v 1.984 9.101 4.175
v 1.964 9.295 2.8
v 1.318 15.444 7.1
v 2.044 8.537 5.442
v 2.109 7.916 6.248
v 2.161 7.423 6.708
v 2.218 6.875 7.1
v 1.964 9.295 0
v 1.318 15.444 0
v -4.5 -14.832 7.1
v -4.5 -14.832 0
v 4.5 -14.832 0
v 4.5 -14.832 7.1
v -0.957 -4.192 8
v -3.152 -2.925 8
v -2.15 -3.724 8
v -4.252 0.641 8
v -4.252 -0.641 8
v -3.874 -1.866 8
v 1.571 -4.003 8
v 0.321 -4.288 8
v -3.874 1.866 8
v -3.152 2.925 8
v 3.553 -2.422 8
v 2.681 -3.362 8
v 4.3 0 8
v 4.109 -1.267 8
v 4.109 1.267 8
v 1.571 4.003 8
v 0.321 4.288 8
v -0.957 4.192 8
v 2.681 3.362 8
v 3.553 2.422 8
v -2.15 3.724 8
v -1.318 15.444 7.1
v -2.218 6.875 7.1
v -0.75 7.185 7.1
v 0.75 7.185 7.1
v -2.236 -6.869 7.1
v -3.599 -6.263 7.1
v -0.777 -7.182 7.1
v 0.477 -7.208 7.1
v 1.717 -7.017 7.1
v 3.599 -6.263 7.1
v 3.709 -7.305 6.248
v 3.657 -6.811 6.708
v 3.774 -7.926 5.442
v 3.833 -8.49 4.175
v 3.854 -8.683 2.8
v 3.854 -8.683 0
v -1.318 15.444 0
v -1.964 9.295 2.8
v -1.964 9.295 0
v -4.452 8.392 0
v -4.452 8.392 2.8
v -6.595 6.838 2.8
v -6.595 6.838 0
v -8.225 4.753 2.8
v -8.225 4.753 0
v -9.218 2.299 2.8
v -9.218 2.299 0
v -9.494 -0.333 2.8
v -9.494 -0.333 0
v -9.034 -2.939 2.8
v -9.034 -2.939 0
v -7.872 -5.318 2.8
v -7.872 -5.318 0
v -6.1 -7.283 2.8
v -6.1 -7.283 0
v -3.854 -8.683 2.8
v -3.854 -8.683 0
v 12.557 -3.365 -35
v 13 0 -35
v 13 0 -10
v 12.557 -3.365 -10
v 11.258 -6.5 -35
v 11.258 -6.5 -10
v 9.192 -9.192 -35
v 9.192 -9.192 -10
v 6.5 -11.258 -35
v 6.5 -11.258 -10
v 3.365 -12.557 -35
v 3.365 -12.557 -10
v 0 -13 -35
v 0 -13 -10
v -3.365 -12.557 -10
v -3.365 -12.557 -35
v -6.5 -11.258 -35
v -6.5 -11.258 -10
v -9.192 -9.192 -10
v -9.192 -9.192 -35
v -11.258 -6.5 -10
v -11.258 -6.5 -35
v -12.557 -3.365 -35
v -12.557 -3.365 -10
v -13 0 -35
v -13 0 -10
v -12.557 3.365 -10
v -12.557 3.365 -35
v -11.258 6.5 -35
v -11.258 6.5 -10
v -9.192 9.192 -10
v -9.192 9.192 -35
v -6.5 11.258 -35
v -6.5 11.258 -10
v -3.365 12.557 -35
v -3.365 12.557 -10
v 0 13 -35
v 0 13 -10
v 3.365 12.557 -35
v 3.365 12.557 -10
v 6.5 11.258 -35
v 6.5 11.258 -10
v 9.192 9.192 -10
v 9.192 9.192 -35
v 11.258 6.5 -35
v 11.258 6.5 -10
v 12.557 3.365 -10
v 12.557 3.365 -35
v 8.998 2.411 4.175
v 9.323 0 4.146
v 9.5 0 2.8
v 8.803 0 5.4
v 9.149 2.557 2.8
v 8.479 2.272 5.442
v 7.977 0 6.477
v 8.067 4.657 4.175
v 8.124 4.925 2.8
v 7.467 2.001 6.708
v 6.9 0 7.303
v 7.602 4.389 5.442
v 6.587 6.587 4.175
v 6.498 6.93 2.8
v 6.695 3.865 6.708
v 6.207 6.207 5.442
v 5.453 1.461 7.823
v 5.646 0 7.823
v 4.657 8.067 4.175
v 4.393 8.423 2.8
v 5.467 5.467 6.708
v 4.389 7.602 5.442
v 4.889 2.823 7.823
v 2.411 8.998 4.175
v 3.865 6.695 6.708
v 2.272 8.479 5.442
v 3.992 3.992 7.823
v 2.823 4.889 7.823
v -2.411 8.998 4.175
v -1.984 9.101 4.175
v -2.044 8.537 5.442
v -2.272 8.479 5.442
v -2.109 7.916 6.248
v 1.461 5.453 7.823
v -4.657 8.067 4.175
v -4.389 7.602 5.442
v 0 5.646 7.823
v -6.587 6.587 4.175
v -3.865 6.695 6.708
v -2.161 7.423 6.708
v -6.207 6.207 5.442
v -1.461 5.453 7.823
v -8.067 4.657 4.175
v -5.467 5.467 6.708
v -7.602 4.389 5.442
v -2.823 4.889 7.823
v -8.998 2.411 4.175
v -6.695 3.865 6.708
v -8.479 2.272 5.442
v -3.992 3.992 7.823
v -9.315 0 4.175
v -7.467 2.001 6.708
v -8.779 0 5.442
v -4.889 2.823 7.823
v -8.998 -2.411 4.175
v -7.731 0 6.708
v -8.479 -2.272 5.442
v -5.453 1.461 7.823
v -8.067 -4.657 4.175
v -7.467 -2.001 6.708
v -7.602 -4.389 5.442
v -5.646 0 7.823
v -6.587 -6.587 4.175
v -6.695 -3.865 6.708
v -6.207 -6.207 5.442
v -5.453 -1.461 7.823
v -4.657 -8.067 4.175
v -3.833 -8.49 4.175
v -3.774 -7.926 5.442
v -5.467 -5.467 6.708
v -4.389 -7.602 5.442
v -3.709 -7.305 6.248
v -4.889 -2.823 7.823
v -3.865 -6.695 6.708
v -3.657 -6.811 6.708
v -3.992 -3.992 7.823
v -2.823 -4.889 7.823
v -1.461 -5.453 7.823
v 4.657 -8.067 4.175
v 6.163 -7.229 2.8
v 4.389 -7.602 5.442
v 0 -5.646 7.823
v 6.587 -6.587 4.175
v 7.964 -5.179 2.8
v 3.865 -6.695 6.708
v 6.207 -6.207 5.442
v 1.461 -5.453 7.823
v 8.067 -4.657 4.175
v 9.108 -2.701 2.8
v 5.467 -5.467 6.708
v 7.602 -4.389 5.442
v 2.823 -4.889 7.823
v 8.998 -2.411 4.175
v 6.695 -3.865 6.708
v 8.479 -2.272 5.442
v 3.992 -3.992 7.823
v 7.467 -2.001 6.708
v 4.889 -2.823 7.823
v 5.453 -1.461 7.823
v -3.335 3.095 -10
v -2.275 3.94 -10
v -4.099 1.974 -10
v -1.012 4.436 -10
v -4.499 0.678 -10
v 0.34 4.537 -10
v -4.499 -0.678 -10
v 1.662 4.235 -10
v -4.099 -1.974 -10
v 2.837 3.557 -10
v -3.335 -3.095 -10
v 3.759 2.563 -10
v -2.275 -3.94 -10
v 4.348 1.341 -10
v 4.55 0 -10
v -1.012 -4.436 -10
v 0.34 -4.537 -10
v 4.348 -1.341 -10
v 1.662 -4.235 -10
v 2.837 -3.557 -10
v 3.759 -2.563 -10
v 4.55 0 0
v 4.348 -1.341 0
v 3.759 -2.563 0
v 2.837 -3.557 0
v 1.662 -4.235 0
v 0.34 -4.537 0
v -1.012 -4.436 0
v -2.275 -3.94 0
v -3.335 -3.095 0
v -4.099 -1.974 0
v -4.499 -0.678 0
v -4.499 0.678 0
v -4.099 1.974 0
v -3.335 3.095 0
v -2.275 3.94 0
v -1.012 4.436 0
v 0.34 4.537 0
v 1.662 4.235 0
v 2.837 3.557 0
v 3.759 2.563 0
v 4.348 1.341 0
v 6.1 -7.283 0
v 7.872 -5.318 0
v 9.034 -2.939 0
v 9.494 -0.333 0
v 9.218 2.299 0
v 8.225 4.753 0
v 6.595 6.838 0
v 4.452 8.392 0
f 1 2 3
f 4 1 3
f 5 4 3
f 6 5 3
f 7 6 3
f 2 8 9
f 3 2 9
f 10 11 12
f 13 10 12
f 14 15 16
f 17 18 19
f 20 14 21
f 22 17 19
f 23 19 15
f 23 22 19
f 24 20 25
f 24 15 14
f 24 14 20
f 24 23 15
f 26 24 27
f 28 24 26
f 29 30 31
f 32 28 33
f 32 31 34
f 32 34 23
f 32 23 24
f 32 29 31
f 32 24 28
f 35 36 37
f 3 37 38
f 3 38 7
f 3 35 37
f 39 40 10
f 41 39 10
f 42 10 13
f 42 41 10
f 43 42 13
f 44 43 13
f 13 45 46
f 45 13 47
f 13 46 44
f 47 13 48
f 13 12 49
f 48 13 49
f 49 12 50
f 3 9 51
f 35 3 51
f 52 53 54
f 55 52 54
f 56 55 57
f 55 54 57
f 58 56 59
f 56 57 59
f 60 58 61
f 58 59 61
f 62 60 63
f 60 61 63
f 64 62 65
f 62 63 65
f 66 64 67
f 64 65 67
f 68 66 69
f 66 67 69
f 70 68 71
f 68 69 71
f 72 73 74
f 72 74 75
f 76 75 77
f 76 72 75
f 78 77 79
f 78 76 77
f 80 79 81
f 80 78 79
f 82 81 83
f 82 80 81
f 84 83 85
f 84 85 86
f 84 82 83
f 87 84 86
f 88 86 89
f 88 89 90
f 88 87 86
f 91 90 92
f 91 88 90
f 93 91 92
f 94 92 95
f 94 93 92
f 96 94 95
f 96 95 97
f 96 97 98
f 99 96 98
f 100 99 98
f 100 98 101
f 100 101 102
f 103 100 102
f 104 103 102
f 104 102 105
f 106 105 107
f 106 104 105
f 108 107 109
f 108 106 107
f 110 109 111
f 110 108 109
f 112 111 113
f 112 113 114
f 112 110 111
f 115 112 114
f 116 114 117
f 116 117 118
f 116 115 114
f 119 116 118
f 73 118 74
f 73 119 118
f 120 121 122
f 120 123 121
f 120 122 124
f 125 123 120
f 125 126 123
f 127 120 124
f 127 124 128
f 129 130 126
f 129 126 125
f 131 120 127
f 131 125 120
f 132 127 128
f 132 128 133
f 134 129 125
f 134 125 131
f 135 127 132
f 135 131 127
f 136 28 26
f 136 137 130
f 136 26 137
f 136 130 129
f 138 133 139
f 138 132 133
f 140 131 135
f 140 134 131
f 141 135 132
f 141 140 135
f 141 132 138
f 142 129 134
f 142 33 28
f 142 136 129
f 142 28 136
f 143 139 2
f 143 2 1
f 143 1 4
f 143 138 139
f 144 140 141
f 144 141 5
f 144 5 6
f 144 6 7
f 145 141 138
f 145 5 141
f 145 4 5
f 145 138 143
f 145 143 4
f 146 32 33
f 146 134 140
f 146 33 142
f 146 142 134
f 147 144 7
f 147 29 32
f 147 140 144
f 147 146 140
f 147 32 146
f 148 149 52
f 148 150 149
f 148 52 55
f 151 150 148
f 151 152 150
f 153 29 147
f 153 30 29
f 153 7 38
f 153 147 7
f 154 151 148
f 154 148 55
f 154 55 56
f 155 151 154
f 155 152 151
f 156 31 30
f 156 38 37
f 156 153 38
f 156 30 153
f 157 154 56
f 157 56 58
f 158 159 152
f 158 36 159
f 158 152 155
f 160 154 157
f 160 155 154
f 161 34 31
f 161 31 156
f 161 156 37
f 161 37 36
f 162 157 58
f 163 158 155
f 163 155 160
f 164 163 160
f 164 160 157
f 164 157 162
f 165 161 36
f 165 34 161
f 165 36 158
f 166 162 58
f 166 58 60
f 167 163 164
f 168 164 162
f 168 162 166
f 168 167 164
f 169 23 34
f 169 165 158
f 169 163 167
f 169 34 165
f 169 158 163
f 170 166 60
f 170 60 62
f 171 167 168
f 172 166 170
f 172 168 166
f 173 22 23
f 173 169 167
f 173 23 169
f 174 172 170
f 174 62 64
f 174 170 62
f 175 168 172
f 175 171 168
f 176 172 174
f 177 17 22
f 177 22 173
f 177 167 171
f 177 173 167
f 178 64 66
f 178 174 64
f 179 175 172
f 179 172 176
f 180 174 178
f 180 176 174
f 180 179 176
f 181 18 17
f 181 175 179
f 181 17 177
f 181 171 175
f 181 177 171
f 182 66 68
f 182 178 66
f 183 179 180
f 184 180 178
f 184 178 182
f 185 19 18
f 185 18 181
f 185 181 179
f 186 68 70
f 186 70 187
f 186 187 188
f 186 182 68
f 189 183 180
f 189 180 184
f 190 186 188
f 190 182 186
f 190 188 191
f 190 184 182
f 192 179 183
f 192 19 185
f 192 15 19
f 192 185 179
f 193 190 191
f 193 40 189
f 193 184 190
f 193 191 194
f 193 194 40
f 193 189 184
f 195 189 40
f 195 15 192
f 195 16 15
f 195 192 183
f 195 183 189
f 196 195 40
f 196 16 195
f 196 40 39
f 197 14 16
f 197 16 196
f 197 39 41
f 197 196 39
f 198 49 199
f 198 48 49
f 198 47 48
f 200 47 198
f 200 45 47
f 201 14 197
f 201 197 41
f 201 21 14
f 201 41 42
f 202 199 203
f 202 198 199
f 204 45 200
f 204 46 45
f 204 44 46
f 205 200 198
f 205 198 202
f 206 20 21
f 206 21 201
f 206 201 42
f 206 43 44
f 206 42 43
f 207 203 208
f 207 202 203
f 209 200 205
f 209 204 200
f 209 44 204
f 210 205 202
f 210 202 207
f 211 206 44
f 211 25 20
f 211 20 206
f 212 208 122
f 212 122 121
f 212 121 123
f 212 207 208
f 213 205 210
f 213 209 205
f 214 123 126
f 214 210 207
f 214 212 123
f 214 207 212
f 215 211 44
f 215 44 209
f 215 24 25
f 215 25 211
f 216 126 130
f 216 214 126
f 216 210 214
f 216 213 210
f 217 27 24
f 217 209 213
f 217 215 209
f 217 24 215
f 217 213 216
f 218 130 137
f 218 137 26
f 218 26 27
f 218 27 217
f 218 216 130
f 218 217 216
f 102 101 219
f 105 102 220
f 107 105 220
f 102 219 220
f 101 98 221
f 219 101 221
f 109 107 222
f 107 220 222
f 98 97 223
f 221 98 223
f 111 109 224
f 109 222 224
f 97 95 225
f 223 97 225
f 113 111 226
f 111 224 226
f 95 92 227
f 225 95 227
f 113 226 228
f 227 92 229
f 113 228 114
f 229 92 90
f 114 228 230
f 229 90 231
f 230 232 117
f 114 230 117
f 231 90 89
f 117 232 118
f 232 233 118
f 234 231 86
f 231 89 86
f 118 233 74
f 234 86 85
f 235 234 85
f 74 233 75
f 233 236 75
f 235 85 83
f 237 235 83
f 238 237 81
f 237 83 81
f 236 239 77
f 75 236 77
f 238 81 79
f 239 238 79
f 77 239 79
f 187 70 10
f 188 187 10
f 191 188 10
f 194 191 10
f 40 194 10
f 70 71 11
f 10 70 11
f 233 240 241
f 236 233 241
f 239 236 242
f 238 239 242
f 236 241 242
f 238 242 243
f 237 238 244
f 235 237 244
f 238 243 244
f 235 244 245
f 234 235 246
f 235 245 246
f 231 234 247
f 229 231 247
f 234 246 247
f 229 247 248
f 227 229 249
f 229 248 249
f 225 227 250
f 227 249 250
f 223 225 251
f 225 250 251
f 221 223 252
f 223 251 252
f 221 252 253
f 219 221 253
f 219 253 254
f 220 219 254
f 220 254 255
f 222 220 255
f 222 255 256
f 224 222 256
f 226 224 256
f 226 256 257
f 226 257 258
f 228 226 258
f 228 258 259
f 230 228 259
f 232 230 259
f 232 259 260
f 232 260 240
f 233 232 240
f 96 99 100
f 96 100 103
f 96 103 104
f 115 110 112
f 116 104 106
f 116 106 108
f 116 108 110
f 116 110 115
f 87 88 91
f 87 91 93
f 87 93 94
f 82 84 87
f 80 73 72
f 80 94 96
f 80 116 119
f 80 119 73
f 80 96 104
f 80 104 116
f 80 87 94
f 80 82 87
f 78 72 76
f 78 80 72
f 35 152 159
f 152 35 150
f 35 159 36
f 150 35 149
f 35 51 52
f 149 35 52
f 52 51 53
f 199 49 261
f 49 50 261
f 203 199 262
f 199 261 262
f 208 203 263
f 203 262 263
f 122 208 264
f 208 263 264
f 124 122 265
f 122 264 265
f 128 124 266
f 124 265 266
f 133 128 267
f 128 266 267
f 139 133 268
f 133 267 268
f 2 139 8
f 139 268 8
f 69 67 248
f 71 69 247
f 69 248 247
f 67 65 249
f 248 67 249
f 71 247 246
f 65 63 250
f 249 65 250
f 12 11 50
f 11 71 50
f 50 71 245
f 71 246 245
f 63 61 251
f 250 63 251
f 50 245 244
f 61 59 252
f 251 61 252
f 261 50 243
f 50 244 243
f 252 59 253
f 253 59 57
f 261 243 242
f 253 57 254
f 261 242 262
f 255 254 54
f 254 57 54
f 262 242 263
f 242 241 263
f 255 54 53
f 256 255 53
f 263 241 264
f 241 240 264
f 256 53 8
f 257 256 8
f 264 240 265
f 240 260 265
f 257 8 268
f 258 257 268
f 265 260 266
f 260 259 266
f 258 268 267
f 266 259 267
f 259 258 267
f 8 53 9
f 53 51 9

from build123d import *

# Parameters (mm, degrees)
F0_R     = 9.5
F1_DEPTH = 8
F2_R     = 5.2
F4_DEPTH = 7.1
F5_R     = 4.55
F6_DEPTH = 35
F7_R     = 13
F7_R_2   = 4.55
F8_DEPTH = 25


with BuildPart() as f1:
    # F0 (on Top) → F1 (new body)
    with BuildSketch(Plane.XY):
        Circle(F0_R)
    extrude(amount=F1_DEPTH)

    # F2
    f2_edges = [f1.edges().sort_by_distance(p)[0] for p in [
        (-9.5, 0, 8),
    ]]
    fillet(f2_edges, radius=F2_R)

    # F3 (on Top) → F4 (join)
    with BuildSketch(Plane.XY):
        Polygon((4.5, -14.8323969742), (1.3178354695, 15.4438761221), (-1.3178354695, 15.4438761221), (-4.5, -14.8323969742), align=None)
    extrude(amount=F4_DEPTH)

    # F5 (on face) → F6 (join)
    with BuildSketch(Plane(origin=(0, 0, 0), x_dir=(1, 0, 0), z_dir=(0, 0, -1))):
        Circle(F5_R)
    extrude(amount=F6_DEPTH)

    # F7 (on face) → F8 (join)
    with BuildSketch(Plane(origin=(0, 0, -35), x_dir=(1, 0, 0), z_dir=(0, 0, -1))):
        Circle(F7_R)
        Circle(F7_R_2, mode=Mode.SUBTRACT)
    extrude(amount=-F8_DEPTH)


solid = f1.part
